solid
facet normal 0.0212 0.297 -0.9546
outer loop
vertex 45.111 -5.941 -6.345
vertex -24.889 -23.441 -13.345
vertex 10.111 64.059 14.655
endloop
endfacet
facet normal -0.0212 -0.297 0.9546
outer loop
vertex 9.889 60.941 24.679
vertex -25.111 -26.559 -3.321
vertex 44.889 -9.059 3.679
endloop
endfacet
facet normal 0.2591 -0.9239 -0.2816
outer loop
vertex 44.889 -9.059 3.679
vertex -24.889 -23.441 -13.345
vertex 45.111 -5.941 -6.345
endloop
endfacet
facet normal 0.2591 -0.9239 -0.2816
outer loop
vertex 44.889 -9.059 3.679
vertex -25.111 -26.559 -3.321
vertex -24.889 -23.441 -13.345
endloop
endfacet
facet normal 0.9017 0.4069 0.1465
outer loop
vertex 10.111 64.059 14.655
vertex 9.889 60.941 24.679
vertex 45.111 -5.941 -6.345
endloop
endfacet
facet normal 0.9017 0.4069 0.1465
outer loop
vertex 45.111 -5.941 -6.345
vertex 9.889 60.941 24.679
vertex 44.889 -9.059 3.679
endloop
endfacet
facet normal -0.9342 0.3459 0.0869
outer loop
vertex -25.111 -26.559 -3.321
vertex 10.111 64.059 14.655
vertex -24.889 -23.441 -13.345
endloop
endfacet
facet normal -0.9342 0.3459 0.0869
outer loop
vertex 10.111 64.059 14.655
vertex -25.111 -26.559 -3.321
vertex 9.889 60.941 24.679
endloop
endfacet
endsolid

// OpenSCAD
// 3D三角形に厚みを持たせ、その重心を中心に拡大縮小するモジュール
module solid_triangle_scaled(p1, p2, p3, thickness, scale_factor = 1) {
    // ベクトル計算
    v12 = p2 - p1;
    v13 = p3 - p1;
    normal_vec = cross(v12, v13); // 法線ベクトル
    normal_len = norm(normal_vec); // 法線ベクトルの長さ

    // スケーリングファクターの妥当性確認と調整
    actual_scale_factor = scale_factor;
    if (scale_factor <= 0 && scale_factor != 1) { // 0以下は無効（1と異なる場合のみ警告）
        echo(str("Warning: scale_factor (", scale_factor, ") must be positive. Using 1 (no scaling)."));
        actual_scale_factor = 1;
    }
    // 厚みの妥当性確認 (ここでは0以上を許容。0なら厚みなしの面になるが、polyhedronとしては描画される)
    if (thickness < 0){
        echo(str("Warning: thickness (", thickness, ") should be non-negative. Using 0."));
        thickness = 0;
    }


    if (normal_len < 0.00001) { // 3点がほぼ一直線上にある場合 (縮退ケース)
        echo(str("Warning: Points ", p1, ", ", p2, ", ", p3, " are nearly collinear. Cannot form a proper solid triangle."));
        // 縮退ケースでは、元の3点の中心に小さな球を表示するなどのフォールバック
        object_center_collinear = (p1 + p2 + p3) / 3;
        translate(object_center_collinear) {
            sphere(r = 0.1 * thickness > 0 ? thickness : 1, $fn=8); // 非常に小さなオブジェクト
        }
    } else { // 通常の三角形の場合
        unit_normal = normal_vec / normal_len; // 正規化された法線ベクトル

        // 1. 三角柱の6つの頂点を計算
        pt0_orig = p1 - unit_normal * thickness / 2; // 底面
        pt1_orig = p2 - unit_normal * thickness / 2;
        pt2_orig = p3 - unit_normal * thickness / 2;
        pt3_orig = p1 + unit_normal * thickness / 2; // 上面
        pt4_orig = p2 + unit_normal * thickness / 2;
        pt5_orig = p3 + unit_normal * thickness / 2;

        original_vertices = [
            pt0_orig, pt1_orig, pt2_orig,
            pt3_orig, pt4_orig, pt5_orig
        ];

        // 2. 三角柱の重心を計算
        centroid_prism = (pt0_orig + pt1_orig + pt2_orig + pt3_orig + pt4_orig + pt5_orig) / 6;

        // 面の定義 (polyhedron用)
        solid_faces = [
            [0, 2, 1],  // 底面 (p1, p3, p2) - 外向き法線のため巻き順調整
            [3, 4, 5],  // 上面 (p1_top, p2_top, p3_top)
            [0, 1, 4], [0, 4, 3], // 側面1 (p1-p2-p2_top-p1_top)
            [1, 2, 5], [1, 5, 4], // 側面2 (p2-p3-p3_top-p2_top)
            [2, 0, 3], [2, 3, 5]  // 側面3 (p3-p1-p1_top-p3_top)
        ];

        // 3. スケーリングと描画
        if (actual_scale_factor == 1) {
            // スケーリングなし: 元の頂点で polyhedron を描画
            polyhedron(points = original_vertices, faces = solid_faces, convexity = 5);
        } else {
            // スケーリングあり: 重心中心にスケーリング
            translate(centroid_prism) {
                scale(actual_scale_factor) {
                    translate(-centroid_prism) {
                        // スケーリング対象のオブジェクト (元の三角柱)
                        polyhedron(points = original_vertices, faces = solid_faces, convexity = 5);
                    }
                }
            }
        }
    }
}

// --- 使用例 ---
P1_orig = [0, 0, 0];
P2_orig = [20, 5, 2];
P3_orig = [10, 25, 8];
thickness_val = 3;

// 例1: スケーリングなし (scale_factor = 1)
color("blue") {
    solid_triangle_scaled(P1_orig, P2_orig, P3_orig, thickness_val, scale_factor = 1);
}

// 例2: 50%に縮小
translate([0,0,0]) { // 表示位置をずらす
    color("red") {
        solid_triangle_scaled(P1_orig, P2_orig, P3_orig, thickness_val, scale_factor = 0.5);
    }
}

// 例3: 150%に拡大
translate([0,0,0]) { // 表示位置をずらす
    color("green") {
        solid_triangle_scaled(P1_orig, P2_orig, P3_orig, thickness_val, scale_factor = 3.5);
    }
}

// 元の3点の位置を小さな球で示す (参考)
%color("yellow") {
    translate(P1_orig) sphere(r=6, $fn=12);
    translate(P2_orig) sphere(r=4, $fn=12);
    translate(P3_orig) sphere(r=4, $fn=12);
}
